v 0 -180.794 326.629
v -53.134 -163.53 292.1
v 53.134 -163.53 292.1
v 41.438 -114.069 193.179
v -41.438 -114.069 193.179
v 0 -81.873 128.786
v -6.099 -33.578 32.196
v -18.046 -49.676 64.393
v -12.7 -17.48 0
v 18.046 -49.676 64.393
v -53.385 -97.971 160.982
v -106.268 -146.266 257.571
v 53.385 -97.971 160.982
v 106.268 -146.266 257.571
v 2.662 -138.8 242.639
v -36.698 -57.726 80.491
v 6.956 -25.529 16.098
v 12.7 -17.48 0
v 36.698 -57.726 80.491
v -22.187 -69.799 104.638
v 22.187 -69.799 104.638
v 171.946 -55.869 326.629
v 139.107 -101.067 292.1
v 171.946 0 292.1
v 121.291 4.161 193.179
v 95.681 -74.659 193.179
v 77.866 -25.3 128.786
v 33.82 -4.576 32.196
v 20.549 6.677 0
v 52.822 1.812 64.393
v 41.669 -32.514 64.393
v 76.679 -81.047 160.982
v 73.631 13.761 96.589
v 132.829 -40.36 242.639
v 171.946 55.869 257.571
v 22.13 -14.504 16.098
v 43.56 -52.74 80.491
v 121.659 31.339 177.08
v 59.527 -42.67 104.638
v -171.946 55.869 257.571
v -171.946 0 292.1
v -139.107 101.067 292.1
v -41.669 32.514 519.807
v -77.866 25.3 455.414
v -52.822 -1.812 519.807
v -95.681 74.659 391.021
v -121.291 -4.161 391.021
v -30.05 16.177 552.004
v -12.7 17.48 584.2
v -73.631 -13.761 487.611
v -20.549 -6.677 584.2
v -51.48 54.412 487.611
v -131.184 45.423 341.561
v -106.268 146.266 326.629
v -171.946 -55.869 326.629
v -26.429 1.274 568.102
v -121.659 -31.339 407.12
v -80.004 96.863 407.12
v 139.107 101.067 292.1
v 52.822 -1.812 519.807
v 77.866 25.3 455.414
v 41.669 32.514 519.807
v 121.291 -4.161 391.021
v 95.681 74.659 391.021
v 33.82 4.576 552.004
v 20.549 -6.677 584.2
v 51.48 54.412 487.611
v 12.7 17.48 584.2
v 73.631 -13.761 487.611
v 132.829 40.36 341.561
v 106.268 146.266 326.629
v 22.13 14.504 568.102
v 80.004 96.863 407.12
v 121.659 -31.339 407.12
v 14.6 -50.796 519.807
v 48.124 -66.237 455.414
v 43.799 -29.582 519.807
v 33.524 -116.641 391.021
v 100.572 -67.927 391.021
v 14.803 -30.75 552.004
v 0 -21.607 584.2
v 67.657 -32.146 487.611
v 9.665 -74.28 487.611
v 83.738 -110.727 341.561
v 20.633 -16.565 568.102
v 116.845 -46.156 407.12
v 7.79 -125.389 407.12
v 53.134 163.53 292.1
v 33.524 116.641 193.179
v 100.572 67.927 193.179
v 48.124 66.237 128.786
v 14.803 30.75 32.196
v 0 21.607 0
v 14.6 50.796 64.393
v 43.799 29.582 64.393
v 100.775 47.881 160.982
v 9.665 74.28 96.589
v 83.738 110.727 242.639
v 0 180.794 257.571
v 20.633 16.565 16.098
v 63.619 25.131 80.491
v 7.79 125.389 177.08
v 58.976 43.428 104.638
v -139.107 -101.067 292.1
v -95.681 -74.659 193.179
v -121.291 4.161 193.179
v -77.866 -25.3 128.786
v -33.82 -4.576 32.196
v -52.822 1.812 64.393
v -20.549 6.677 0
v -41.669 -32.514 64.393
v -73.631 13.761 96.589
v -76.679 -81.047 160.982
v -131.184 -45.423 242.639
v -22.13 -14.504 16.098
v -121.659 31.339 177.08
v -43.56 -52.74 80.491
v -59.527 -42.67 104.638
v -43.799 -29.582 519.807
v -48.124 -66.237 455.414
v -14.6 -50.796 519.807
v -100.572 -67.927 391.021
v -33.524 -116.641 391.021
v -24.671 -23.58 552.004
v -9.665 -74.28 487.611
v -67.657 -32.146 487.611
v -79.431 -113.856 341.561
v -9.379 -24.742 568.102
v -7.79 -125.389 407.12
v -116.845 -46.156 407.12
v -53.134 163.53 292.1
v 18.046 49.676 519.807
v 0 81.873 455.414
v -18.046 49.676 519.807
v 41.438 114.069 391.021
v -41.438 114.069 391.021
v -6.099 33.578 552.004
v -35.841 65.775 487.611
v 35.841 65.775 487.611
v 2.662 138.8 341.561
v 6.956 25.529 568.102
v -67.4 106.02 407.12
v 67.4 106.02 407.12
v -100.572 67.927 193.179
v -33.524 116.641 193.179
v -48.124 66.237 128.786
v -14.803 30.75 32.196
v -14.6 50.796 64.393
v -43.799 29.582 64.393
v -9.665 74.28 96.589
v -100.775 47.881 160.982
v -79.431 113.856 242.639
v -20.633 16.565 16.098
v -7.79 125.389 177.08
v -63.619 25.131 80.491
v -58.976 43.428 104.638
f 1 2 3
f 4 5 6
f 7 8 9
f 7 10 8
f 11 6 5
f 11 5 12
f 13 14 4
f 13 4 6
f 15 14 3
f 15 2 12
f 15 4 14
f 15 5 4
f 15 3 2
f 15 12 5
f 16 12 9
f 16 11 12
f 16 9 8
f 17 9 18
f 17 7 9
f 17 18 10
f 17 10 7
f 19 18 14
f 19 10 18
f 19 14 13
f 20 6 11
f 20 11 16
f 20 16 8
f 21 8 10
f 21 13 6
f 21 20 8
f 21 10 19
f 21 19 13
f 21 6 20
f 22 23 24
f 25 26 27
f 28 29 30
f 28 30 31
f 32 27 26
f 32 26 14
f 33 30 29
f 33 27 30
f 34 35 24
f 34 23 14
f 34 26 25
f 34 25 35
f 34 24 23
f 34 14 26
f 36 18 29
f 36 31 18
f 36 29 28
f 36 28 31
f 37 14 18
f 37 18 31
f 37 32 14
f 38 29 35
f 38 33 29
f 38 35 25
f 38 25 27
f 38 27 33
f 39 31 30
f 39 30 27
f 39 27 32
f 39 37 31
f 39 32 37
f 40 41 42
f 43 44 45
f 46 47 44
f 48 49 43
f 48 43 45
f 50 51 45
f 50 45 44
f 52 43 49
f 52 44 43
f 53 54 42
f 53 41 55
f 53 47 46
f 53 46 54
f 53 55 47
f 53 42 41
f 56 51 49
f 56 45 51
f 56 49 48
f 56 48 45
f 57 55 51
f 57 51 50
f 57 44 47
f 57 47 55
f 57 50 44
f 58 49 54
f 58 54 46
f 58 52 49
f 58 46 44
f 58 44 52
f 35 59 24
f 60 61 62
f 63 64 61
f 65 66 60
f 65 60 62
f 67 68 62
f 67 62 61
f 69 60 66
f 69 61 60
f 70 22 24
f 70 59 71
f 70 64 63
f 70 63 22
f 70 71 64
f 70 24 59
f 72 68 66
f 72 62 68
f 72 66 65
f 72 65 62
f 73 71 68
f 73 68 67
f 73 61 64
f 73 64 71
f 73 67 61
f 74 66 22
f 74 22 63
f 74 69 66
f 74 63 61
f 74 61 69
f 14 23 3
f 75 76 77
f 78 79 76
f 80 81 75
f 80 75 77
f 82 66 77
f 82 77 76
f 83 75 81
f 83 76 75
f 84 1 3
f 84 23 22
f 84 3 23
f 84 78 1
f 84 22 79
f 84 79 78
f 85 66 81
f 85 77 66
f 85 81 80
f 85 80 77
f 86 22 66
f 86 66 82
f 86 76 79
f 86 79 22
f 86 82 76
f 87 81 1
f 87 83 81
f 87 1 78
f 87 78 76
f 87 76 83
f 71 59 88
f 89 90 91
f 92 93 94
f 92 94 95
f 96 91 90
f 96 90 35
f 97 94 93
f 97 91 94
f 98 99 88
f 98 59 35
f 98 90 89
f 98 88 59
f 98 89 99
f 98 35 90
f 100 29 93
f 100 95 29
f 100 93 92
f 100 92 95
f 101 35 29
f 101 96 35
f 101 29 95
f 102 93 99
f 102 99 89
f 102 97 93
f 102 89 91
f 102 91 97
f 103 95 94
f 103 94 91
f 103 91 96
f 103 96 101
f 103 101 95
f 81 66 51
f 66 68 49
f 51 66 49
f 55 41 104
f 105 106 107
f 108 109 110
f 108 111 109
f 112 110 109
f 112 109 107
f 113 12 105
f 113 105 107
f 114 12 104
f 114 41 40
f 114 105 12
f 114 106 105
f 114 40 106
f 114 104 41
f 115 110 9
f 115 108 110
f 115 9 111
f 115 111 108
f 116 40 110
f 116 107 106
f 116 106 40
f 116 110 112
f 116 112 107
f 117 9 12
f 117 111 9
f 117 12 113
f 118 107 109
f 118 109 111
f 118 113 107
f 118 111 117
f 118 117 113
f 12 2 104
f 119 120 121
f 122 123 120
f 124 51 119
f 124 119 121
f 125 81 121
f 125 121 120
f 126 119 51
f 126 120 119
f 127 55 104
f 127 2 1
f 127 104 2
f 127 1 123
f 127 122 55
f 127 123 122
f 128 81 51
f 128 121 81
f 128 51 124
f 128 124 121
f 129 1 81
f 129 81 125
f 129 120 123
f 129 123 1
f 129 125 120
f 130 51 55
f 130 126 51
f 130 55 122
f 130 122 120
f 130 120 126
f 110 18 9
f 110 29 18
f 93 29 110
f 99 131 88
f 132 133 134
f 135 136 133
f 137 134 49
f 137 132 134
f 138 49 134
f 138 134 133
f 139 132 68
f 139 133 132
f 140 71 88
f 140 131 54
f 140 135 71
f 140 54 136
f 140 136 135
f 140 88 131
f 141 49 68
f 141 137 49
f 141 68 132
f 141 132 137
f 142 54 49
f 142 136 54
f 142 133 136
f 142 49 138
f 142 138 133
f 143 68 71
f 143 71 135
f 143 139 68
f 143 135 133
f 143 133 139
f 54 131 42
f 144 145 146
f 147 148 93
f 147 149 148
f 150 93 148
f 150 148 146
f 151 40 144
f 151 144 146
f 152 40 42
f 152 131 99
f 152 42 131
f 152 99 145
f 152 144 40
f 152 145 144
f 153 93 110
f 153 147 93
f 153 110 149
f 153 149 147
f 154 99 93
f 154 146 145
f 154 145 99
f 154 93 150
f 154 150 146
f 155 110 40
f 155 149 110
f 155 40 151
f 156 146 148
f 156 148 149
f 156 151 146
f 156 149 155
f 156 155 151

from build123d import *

# Parameters (mm, degrees)
F1_DEPTH = 584.2
F1_TAPER = -26.5650511771
F3_DEPTH = 584.2010001
F3_TAPER = 26.5650511771


with BuildPart() as f1:
    # F0 (on Top) → F1 (new body)
    with BuildSketch(Plane.XY):
        Polygon((12.7, -17.48005039), (20.5490316571, 6.6767851239), (0, 21.6065305321), (-20.5490316571, 6.6767851239), (-12.7, -17.48005039), align=None)
    extrude(amount=F1_DEPTH, taper=F1_TAPER)

    # F2 (on face) → F3 (cut, through all)
    with BuildSketch(Plane.XY.offset(584.2)):
        Polygon((0, 382.6619867598), (-363.9331760464, 118.2490570101), (-224.9230724304, -309.58005039), (224.9230724304, -309.58005039), (363.9331760464, 118.2490570101), align=None)
        Polygon((-12.7, 17.48005039), (12.7, 17.48005039), (20.5490316571, -6.6767851239), (0, -21.6065305321), (-20.5490316571, -6.6767851239), align=None, mode=Mode.SUBTRACT)
    extrude(amount=-F3_DEPTH, taper=F3_TAPER, mode=Mode.SUBTRACT)


solid = f1.part
